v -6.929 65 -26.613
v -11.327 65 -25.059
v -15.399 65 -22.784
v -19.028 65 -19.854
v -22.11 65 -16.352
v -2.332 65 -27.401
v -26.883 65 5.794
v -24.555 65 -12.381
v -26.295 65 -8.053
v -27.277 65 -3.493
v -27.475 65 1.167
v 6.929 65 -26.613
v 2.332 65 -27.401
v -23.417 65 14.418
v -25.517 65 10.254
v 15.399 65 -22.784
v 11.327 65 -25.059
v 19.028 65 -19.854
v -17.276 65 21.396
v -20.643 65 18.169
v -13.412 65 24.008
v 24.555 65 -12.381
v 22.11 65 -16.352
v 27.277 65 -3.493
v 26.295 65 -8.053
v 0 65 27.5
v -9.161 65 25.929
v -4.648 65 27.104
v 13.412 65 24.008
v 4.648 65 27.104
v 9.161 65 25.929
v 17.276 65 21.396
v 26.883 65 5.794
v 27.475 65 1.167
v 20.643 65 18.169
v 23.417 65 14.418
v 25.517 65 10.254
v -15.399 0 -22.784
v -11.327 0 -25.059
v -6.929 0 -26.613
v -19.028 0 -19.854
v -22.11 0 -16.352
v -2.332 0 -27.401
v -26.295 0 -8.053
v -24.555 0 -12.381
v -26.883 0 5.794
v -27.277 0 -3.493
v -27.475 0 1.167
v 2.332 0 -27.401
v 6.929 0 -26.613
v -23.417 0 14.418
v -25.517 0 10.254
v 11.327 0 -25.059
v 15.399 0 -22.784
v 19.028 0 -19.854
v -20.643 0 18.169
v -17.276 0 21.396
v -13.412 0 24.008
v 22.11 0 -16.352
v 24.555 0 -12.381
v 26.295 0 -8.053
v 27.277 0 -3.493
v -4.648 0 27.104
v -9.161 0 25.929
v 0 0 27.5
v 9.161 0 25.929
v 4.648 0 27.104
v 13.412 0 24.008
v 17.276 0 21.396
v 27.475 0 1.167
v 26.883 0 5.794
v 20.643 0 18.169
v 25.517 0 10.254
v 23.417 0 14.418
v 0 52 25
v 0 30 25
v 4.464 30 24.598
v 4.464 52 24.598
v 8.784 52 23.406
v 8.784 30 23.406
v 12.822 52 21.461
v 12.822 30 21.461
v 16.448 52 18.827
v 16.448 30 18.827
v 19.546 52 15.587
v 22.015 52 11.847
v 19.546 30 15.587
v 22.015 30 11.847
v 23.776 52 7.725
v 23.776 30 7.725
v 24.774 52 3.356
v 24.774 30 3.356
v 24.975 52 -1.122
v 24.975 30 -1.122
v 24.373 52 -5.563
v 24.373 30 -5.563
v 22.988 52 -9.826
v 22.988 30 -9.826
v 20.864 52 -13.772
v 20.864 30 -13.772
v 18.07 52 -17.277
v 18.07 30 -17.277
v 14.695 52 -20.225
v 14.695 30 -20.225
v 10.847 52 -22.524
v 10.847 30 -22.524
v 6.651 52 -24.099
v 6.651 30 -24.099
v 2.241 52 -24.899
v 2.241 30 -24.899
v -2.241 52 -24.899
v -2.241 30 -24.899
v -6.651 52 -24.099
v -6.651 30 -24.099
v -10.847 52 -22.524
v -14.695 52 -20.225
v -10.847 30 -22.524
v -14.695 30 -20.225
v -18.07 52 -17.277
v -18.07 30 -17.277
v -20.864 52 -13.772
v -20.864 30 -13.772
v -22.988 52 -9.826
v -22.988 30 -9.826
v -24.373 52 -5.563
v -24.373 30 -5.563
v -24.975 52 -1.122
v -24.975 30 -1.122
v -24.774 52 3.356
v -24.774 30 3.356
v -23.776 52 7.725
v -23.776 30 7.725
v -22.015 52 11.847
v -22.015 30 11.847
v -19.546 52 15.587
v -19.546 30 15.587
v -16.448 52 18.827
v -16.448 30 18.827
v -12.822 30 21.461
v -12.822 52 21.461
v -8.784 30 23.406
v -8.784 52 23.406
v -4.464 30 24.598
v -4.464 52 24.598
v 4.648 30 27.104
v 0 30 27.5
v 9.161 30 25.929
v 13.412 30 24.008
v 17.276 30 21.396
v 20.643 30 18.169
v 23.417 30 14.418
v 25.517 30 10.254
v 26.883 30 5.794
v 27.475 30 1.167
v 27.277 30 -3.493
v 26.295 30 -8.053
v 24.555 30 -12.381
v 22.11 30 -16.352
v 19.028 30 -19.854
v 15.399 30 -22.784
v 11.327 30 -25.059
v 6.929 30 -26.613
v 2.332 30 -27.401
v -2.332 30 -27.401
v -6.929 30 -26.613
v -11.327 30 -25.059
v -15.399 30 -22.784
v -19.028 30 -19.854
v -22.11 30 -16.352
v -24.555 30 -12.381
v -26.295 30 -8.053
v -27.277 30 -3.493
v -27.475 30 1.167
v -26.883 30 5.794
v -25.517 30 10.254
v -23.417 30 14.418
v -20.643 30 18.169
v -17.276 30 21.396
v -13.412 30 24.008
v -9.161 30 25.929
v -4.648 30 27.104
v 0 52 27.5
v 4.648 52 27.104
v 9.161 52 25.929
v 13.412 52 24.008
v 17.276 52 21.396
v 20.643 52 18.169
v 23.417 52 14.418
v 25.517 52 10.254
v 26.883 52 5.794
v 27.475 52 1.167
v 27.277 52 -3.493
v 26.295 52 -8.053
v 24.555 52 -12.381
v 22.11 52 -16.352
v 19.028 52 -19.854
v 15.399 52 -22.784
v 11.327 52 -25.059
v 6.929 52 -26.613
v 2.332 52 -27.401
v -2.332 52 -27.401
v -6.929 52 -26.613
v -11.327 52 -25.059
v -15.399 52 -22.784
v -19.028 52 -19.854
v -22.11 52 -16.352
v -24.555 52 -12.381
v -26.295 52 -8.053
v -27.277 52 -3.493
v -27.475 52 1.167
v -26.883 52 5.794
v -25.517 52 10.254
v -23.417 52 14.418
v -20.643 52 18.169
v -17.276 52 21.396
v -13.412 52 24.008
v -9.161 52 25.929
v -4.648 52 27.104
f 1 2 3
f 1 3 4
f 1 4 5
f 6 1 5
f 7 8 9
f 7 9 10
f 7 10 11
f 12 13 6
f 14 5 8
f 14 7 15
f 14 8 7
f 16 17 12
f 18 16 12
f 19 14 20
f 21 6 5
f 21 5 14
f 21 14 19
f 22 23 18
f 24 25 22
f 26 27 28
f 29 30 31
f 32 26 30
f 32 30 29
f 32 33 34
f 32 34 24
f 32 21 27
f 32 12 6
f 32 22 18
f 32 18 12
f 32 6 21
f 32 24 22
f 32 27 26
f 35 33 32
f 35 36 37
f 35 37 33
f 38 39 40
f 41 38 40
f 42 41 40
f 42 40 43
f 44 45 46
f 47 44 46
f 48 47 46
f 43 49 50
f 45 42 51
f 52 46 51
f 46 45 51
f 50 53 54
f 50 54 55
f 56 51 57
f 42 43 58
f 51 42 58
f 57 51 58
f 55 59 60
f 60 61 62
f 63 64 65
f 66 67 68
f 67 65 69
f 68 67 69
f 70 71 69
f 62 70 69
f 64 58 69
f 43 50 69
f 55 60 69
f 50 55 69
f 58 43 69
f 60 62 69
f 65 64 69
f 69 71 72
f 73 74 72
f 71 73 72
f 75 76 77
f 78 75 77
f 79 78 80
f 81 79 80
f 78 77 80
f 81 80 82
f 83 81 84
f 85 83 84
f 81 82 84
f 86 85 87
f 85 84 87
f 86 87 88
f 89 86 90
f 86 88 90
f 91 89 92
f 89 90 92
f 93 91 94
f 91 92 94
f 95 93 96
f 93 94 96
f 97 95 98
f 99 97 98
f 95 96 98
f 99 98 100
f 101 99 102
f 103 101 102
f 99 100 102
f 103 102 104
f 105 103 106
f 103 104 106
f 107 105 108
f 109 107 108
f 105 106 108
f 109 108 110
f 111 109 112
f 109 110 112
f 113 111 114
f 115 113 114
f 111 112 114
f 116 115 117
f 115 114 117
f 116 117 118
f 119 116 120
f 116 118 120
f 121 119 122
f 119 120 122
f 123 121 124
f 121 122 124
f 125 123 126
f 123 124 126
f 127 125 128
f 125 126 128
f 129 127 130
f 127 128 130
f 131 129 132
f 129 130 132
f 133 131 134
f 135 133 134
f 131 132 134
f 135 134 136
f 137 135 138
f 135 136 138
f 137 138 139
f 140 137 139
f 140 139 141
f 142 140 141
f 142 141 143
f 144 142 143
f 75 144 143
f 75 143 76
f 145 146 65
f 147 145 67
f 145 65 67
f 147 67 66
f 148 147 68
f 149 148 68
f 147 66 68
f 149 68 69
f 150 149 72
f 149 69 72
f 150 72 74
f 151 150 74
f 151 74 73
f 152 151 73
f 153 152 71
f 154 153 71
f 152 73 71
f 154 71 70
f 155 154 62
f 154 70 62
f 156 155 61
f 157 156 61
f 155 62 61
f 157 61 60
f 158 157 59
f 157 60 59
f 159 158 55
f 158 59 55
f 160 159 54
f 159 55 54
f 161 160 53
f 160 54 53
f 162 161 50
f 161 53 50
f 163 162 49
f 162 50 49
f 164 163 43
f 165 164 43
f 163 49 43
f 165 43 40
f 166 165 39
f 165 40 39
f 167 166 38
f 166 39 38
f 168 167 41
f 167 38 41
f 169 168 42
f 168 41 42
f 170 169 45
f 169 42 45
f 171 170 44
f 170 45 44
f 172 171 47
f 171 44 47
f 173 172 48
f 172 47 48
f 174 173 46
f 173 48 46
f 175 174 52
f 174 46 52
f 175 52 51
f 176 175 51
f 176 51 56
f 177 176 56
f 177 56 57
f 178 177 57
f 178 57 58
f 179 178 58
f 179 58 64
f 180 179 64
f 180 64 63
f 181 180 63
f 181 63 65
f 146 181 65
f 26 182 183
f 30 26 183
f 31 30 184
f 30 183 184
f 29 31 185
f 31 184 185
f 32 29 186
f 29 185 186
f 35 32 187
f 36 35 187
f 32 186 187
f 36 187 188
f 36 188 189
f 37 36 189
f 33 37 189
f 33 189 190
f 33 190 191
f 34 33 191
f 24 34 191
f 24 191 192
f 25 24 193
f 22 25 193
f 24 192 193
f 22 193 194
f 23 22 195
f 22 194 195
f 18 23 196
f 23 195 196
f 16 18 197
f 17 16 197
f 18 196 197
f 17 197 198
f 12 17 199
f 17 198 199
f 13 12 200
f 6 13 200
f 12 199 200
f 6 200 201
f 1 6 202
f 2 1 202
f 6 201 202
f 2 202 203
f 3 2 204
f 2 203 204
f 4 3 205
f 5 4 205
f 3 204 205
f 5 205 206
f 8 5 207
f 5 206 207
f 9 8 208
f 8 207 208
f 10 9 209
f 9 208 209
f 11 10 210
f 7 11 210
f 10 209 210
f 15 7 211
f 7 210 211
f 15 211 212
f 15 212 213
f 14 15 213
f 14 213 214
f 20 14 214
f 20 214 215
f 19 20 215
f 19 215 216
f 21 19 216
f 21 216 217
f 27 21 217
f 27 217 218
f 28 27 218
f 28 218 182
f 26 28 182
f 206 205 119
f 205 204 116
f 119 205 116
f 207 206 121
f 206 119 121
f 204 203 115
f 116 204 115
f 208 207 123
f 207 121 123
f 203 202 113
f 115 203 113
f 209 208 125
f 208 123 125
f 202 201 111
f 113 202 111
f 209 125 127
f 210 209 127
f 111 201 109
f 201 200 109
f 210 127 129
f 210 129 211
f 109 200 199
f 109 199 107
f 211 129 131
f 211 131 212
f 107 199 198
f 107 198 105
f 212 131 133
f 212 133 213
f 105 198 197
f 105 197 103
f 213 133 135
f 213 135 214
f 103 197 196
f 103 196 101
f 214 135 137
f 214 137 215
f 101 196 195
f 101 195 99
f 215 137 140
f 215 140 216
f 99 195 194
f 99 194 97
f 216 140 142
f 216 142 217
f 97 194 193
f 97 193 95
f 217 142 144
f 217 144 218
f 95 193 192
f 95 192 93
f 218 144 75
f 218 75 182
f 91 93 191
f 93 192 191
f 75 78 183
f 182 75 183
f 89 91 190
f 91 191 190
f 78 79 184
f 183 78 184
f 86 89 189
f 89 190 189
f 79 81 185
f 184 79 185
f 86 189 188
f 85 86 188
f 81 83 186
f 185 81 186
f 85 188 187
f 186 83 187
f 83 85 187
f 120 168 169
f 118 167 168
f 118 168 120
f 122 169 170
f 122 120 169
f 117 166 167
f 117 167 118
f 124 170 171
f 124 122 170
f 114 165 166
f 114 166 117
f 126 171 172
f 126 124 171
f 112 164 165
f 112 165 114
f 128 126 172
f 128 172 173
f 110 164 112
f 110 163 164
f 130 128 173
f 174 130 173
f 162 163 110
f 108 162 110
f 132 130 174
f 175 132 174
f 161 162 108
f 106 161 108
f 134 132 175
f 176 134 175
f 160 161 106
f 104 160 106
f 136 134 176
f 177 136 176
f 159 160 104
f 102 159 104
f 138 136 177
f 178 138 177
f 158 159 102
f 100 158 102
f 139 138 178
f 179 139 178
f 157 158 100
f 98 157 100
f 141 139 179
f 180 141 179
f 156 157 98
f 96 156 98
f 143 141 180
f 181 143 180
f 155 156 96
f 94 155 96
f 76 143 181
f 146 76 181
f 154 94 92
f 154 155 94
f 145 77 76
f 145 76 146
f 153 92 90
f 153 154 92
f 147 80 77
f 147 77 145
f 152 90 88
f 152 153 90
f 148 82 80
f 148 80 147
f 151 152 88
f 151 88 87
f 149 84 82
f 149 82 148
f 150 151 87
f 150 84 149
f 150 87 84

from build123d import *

# Parameters (mm, degrees)
SKETCH_1_R      = 27.5
EXTRUDE_1_DEPTH = 30
SKETCH_2_R      = 25
EXTRUDE_2_DEPTH = 22
SKETCH_3_R      = 27.5
EXTRUDE_3_DEPTH = 13


with BuildPart() as part:
    # Эскиз1 → Бобышка-Вытянуть1 (new body)
    with BuildSketch(Plane(origin=(0, 0, 0), x_dir=(1, 0, 0), z_dir=(0, 1, 0))):
        with Locations(Location((0, 0, 0), (0, 0, 270))):
            Circle(SKETCH_1_R)
    extrude(amount=EXTRUDE_1_DEPTH)

    # Эскиз2 → Бобышка-Вытянуть2 (add)
    with BuildSketch(Plane(origin=(0, 30, 0), x_dir=(1, 0, 0), z_dir=(0, 1, 0))):
        with Locations(Location((0, 0, 0), (0, 0, 270))):
            Circle(SKETCH_2_R)
    extrude(amount=EXTRUDE_2_DEPTH)

    # Эскиз3 → Бобышка-Вытянуть3 (add)
    with BuildSketch(Plane(origin=(0, 52, 0), x_dir=(1, 0, 0), z_dir=(0, 1, 0))):
        with Locations(Location((0, 0, 0), (0, 0, 270))):
            Circle(SKETCH_3_R)
    extrude(amount=EXTRUDE_3_DEPTH)


solid = part.part
